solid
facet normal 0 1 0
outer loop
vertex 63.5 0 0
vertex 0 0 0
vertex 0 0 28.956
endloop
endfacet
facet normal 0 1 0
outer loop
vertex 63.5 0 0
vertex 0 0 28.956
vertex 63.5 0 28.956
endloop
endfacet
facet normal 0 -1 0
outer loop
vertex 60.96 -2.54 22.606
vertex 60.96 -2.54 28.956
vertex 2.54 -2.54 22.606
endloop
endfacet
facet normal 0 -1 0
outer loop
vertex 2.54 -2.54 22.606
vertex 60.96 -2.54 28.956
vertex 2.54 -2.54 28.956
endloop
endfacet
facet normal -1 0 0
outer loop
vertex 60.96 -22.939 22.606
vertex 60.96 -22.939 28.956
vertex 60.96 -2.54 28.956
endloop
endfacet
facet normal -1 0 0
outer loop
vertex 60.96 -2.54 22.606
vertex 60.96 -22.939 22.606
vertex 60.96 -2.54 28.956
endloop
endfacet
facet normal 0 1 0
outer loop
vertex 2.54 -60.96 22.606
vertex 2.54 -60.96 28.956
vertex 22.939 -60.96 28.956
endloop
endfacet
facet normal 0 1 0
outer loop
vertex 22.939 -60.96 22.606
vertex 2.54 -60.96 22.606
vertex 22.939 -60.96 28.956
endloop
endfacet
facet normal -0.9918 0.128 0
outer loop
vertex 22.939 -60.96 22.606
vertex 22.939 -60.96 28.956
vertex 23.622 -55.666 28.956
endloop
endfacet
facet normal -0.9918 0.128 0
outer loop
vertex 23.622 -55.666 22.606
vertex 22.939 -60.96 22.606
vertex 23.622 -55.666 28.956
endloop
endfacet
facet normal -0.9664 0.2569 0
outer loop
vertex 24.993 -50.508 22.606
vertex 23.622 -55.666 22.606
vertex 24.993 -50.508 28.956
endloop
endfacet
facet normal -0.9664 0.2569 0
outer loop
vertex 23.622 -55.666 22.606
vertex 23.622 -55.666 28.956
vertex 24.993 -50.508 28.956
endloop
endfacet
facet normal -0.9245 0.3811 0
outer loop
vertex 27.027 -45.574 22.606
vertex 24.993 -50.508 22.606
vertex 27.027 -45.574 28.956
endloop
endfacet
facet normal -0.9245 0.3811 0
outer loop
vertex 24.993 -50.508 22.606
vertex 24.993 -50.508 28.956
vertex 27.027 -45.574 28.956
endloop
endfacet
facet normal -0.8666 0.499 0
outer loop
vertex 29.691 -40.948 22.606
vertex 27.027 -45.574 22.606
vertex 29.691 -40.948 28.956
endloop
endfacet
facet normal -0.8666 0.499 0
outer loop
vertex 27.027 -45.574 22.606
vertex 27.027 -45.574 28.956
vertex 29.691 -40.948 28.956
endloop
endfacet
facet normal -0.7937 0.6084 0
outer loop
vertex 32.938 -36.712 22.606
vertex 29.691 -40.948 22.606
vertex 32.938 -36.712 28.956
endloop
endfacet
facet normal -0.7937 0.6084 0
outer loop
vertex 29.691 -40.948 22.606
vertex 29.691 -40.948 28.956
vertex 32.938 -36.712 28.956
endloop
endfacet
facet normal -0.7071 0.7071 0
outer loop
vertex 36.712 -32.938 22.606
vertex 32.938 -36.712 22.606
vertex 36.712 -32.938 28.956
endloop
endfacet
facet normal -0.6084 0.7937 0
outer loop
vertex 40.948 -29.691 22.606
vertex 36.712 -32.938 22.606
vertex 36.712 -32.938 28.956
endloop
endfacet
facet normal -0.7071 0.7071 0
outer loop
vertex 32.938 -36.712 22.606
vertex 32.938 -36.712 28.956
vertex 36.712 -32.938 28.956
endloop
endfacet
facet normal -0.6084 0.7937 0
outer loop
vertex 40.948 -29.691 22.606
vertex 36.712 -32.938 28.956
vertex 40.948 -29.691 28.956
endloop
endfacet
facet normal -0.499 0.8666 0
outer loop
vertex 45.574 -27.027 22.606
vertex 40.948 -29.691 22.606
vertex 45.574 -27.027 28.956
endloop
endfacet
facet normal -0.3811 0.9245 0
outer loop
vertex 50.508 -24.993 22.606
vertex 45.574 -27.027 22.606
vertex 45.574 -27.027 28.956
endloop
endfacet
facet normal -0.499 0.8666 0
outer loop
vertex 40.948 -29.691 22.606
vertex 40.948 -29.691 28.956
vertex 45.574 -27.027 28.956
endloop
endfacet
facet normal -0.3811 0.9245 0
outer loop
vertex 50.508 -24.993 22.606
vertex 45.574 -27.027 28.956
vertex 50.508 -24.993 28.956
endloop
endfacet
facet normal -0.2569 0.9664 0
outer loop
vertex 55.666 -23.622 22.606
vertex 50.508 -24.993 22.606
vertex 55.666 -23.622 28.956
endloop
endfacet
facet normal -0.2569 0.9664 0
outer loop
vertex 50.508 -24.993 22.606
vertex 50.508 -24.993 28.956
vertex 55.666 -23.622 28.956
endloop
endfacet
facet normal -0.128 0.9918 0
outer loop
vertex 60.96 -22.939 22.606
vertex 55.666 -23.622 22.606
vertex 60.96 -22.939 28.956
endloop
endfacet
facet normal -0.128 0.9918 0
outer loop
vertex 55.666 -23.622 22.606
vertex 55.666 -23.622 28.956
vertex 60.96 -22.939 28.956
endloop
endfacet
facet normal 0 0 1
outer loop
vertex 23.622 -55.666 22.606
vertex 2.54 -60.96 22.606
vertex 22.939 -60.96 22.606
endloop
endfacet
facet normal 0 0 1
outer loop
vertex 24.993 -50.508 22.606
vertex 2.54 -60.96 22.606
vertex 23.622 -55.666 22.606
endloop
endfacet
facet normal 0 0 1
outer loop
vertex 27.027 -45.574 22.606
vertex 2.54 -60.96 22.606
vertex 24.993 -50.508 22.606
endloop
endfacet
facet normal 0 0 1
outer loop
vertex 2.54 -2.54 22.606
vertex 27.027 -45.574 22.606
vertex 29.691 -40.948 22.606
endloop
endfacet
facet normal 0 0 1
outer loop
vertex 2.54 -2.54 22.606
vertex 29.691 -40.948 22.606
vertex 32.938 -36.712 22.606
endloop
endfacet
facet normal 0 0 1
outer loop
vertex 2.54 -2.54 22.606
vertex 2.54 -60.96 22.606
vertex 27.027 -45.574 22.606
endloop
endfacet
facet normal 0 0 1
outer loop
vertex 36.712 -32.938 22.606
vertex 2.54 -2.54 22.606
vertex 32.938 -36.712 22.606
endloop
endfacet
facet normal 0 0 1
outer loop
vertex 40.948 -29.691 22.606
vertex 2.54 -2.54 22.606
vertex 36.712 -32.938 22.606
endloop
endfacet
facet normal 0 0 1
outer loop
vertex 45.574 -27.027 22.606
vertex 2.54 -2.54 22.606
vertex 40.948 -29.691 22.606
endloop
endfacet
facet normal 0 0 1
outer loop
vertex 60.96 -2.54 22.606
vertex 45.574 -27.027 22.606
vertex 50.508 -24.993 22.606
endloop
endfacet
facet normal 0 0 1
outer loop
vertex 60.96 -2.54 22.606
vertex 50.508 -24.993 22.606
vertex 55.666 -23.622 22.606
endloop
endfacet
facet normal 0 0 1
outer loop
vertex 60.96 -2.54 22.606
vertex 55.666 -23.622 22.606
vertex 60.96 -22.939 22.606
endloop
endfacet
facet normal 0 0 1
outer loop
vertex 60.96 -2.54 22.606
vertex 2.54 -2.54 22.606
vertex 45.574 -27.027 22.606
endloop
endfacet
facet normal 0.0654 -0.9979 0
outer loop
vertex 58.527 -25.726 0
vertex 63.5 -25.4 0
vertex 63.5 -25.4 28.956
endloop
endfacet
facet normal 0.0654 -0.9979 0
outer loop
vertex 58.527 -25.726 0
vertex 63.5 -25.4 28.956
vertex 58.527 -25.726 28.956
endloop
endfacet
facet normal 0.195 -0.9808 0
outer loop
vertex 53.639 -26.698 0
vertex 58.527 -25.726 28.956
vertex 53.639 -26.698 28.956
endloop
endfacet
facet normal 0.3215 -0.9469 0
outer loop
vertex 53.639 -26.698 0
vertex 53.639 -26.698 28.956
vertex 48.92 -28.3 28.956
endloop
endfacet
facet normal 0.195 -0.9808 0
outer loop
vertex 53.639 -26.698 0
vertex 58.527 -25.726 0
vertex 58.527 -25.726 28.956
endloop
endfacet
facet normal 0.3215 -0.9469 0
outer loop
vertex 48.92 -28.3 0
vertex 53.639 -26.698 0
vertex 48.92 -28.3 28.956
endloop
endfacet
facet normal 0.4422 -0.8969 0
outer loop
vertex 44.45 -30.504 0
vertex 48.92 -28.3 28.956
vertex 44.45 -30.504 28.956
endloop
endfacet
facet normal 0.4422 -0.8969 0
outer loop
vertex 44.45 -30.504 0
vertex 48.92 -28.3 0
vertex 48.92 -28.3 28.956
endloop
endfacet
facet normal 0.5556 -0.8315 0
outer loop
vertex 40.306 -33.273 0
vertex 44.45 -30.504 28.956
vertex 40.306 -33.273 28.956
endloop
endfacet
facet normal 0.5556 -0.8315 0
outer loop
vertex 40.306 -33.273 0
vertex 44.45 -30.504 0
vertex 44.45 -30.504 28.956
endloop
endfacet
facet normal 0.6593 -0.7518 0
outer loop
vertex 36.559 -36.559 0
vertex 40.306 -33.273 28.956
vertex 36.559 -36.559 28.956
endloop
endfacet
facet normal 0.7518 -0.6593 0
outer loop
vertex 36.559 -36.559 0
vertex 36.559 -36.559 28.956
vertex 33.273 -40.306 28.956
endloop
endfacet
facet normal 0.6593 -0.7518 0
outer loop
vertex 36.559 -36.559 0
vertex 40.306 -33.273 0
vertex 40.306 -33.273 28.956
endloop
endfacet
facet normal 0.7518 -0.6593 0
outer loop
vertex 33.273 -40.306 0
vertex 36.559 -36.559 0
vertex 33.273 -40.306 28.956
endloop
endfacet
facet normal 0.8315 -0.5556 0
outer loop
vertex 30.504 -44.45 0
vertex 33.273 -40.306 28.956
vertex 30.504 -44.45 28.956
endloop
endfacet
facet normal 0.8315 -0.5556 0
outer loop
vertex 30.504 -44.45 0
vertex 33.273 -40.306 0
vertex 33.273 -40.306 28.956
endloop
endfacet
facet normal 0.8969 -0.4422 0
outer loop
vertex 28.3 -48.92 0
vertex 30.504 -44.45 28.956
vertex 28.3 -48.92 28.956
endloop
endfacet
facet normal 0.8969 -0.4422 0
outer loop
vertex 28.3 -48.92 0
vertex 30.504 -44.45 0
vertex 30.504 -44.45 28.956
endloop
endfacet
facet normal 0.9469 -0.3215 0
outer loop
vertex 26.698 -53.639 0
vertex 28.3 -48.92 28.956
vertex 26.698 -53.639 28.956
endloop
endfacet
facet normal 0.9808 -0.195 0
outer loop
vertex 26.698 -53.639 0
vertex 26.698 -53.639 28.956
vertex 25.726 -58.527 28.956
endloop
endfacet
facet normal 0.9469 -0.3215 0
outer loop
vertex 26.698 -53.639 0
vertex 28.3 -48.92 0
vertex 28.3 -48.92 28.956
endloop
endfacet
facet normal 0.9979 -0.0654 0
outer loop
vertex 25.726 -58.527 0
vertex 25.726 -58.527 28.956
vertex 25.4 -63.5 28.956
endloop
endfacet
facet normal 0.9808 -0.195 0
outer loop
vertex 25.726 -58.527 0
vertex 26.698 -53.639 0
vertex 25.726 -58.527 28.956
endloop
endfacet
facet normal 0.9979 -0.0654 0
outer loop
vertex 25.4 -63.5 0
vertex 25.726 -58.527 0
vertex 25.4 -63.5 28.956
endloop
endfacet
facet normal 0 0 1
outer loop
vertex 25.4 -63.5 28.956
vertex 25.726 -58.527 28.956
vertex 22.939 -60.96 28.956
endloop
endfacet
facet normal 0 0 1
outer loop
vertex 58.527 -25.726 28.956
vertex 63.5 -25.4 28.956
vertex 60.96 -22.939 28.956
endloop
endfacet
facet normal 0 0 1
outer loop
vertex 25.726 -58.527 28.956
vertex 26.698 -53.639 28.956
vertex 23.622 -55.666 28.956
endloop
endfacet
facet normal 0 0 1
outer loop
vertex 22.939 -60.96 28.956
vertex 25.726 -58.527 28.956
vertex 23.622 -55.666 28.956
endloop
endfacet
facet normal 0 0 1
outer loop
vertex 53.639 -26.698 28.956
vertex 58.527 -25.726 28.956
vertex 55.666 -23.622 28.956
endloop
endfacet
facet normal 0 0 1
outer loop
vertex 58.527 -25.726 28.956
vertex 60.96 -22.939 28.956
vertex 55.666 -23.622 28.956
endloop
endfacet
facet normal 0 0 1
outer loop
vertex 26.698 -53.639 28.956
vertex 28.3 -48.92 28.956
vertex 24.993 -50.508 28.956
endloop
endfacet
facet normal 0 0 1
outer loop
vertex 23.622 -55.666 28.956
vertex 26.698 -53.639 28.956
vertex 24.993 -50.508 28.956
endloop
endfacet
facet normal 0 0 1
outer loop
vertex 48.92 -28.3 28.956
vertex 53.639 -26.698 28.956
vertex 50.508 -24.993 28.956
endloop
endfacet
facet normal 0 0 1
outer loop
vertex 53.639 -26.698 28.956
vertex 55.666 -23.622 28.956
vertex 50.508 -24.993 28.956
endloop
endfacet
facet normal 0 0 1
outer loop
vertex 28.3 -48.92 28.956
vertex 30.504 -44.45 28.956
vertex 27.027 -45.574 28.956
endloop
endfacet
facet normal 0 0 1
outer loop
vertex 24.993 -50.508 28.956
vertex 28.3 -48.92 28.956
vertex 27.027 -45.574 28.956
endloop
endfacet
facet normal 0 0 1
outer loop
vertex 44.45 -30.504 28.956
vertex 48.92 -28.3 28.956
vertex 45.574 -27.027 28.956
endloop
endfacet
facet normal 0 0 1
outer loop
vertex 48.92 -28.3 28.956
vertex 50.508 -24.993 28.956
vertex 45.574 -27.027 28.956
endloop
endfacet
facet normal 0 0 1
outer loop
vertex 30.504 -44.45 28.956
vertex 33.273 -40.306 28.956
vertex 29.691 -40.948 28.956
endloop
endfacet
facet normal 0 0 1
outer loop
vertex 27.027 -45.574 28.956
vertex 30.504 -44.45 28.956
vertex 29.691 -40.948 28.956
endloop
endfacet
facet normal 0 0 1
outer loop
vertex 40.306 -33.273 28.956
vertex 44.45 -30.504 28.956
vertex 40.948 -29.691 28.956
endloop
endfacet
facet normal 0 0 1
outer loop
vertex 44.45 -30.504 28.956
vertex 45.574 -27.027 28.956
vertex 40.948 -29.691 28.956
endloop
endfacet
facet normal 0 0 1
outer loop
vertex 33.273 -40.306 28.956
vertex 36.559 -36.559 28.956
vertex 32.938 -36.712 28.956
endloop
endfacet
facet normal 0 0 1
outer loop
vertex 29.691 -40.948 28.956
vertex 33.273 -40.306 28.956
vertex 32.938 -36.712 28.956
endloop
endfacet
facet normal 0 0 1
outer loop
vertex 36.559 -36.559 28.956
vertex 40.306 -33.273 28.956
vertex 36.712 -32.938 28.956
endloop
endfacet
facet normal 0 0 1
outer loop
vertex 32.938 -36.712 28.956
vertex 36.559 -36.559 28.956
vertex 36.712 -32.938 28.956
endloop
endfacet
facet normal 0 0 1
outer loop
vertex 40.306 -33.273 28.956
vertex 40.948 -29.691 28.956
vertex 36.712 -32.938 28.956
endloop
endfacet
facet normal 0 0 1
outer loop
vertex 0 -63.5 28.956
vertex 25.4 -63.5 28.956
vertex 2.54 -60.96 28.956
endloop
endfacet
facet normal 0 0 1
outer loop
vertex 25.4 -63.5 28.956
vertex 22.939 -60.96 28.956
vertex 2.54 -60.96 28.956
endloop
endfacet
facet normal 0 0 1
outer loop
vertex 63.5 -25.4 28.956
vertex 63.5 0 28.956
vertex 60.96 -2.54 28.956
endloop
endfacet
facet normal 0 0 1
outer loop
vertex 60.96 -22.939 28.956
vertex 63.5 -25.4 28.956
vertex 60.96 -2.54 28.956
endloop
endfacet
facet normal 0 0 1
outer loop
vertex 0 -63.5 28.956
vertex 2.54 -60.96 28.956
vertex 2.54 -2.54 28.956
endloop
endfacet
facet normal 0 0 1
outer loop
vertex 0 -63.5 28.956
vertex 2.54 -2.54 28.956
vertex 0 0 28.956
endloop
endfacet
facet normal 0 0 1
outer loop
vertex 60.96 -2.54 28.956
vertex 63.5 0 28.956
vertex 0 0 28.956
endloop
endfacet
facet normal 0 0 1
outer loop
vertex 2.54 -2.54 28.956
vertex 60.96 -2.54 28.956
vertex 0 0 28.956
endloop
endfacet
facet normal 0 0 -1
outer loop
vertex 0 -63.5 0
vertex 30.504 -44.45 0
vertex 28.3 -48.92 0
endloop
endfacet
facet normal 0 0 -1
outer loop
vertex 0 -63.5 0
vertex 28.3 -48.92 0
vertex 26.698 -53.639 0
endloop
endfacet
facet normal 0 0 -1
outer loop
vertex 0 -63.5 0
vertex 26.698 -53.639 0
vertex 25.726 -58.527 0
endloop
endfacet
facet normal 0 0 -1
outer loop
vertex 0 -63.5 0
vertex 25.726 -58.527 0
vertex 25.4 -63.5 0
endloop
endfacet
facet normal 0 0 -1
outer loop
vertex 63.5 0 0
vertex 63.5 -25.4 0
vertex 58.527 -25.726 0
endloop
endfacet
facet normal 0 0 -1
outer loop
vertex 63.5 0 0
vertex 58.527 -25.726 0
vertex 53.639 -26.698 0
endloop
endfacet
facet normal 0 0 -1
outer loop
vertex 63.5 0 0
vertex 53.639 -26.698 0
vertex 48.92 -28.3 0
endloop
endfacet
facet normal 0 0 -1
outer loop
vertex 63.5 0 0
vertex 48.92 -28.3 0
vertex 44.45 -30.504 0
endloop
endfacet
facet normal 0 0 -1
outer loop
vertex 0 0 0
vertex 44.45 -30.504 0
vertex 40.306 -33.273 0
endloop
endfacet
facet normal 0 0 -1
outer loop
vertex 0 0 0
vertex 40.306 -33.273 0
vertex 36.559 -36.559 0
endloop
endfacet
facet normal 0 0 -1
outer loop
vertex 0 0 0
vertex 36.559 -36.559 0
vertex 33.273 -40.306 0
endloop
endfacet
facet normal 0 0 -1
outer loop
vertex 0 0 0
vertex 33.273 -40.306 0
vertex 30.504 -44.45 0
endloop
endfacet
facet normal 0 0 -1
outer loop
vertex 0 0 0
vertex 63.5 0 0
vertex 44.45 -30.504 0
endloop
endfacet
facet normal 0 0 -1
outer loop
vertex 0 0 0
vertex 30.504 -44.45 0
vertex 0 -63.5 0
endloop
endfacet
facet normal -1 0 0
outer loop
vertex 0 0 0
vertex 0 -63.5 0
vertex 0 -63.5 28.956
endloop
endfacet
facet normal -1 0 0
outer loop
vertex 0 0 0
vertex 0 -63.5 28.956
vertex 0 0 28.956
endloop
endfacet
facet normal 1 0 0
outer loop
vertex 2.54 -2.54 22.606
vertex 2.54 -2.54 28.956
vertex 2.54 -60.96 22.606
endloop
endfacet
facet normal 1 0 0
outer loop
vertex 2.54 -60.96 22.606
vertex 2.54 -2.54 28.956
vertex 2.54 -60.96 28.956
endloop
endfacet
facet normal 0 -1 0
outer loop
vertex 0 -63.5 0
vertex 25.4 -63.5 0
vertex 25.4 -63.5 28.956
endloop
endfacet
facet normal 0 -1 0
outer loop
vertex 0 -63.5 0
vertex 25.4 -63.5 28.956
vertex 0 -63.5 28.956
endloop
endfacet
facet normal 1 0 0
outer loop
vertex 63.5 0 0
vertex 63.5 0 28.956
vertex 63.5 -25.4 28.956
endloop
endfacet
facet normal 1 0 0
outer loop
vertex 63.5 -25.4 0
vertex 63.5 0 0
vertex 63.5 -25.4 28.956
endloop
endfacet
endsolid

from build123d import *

# Parameters (mm, degrees)
BOSS_EXTRUDE2_DEPTH = 28.956
CUT_EXTRUDE1_DEPTH  = 6.35


with BuildPart() as part:
    # Sketch1 → Boss-Extrude2 (new body)
    with BuildSketch(Plane.XY):
        with BuildLine():
            Line((0, 0), (63.5, 0))
            Line((63.5, 0), (63.5, -25.4))
            ThreePointArc((63.5, -25.4), (36.559231637, -36.559231637), (25.4, -63.5))
            Line((25.4, -63.5), (0, -63.5))
            Line((0, -63.5), (0, 0))
        make_face()
    extrude(amount=BOSS_EXTRUDE2_DEPTH)

    # Sketch2 → Cut-Extrude1 (cut)
    with BuildSketch(Plane.XY.offset(28.956)):
        with BuildLine():
            Line((2.54, -2.54), (2.54, -60.96))
            Line((2.54, -60.96), (22.939452666, -60.96))
            ThreePointArc((22.939452666, -60.96), (34.763180413, -34.763180413), (60.96, -22.939452666))
            Line((60.96, -22.939452666), (60.96, -2.54))
            Line((60.96, -2.54), (2.54, -2.54))
        make_face()
    extrude(amount=-CUT_EXTRUDE1_DEPTH, mode=Mode.SUBTRACT)


solid = part.part
